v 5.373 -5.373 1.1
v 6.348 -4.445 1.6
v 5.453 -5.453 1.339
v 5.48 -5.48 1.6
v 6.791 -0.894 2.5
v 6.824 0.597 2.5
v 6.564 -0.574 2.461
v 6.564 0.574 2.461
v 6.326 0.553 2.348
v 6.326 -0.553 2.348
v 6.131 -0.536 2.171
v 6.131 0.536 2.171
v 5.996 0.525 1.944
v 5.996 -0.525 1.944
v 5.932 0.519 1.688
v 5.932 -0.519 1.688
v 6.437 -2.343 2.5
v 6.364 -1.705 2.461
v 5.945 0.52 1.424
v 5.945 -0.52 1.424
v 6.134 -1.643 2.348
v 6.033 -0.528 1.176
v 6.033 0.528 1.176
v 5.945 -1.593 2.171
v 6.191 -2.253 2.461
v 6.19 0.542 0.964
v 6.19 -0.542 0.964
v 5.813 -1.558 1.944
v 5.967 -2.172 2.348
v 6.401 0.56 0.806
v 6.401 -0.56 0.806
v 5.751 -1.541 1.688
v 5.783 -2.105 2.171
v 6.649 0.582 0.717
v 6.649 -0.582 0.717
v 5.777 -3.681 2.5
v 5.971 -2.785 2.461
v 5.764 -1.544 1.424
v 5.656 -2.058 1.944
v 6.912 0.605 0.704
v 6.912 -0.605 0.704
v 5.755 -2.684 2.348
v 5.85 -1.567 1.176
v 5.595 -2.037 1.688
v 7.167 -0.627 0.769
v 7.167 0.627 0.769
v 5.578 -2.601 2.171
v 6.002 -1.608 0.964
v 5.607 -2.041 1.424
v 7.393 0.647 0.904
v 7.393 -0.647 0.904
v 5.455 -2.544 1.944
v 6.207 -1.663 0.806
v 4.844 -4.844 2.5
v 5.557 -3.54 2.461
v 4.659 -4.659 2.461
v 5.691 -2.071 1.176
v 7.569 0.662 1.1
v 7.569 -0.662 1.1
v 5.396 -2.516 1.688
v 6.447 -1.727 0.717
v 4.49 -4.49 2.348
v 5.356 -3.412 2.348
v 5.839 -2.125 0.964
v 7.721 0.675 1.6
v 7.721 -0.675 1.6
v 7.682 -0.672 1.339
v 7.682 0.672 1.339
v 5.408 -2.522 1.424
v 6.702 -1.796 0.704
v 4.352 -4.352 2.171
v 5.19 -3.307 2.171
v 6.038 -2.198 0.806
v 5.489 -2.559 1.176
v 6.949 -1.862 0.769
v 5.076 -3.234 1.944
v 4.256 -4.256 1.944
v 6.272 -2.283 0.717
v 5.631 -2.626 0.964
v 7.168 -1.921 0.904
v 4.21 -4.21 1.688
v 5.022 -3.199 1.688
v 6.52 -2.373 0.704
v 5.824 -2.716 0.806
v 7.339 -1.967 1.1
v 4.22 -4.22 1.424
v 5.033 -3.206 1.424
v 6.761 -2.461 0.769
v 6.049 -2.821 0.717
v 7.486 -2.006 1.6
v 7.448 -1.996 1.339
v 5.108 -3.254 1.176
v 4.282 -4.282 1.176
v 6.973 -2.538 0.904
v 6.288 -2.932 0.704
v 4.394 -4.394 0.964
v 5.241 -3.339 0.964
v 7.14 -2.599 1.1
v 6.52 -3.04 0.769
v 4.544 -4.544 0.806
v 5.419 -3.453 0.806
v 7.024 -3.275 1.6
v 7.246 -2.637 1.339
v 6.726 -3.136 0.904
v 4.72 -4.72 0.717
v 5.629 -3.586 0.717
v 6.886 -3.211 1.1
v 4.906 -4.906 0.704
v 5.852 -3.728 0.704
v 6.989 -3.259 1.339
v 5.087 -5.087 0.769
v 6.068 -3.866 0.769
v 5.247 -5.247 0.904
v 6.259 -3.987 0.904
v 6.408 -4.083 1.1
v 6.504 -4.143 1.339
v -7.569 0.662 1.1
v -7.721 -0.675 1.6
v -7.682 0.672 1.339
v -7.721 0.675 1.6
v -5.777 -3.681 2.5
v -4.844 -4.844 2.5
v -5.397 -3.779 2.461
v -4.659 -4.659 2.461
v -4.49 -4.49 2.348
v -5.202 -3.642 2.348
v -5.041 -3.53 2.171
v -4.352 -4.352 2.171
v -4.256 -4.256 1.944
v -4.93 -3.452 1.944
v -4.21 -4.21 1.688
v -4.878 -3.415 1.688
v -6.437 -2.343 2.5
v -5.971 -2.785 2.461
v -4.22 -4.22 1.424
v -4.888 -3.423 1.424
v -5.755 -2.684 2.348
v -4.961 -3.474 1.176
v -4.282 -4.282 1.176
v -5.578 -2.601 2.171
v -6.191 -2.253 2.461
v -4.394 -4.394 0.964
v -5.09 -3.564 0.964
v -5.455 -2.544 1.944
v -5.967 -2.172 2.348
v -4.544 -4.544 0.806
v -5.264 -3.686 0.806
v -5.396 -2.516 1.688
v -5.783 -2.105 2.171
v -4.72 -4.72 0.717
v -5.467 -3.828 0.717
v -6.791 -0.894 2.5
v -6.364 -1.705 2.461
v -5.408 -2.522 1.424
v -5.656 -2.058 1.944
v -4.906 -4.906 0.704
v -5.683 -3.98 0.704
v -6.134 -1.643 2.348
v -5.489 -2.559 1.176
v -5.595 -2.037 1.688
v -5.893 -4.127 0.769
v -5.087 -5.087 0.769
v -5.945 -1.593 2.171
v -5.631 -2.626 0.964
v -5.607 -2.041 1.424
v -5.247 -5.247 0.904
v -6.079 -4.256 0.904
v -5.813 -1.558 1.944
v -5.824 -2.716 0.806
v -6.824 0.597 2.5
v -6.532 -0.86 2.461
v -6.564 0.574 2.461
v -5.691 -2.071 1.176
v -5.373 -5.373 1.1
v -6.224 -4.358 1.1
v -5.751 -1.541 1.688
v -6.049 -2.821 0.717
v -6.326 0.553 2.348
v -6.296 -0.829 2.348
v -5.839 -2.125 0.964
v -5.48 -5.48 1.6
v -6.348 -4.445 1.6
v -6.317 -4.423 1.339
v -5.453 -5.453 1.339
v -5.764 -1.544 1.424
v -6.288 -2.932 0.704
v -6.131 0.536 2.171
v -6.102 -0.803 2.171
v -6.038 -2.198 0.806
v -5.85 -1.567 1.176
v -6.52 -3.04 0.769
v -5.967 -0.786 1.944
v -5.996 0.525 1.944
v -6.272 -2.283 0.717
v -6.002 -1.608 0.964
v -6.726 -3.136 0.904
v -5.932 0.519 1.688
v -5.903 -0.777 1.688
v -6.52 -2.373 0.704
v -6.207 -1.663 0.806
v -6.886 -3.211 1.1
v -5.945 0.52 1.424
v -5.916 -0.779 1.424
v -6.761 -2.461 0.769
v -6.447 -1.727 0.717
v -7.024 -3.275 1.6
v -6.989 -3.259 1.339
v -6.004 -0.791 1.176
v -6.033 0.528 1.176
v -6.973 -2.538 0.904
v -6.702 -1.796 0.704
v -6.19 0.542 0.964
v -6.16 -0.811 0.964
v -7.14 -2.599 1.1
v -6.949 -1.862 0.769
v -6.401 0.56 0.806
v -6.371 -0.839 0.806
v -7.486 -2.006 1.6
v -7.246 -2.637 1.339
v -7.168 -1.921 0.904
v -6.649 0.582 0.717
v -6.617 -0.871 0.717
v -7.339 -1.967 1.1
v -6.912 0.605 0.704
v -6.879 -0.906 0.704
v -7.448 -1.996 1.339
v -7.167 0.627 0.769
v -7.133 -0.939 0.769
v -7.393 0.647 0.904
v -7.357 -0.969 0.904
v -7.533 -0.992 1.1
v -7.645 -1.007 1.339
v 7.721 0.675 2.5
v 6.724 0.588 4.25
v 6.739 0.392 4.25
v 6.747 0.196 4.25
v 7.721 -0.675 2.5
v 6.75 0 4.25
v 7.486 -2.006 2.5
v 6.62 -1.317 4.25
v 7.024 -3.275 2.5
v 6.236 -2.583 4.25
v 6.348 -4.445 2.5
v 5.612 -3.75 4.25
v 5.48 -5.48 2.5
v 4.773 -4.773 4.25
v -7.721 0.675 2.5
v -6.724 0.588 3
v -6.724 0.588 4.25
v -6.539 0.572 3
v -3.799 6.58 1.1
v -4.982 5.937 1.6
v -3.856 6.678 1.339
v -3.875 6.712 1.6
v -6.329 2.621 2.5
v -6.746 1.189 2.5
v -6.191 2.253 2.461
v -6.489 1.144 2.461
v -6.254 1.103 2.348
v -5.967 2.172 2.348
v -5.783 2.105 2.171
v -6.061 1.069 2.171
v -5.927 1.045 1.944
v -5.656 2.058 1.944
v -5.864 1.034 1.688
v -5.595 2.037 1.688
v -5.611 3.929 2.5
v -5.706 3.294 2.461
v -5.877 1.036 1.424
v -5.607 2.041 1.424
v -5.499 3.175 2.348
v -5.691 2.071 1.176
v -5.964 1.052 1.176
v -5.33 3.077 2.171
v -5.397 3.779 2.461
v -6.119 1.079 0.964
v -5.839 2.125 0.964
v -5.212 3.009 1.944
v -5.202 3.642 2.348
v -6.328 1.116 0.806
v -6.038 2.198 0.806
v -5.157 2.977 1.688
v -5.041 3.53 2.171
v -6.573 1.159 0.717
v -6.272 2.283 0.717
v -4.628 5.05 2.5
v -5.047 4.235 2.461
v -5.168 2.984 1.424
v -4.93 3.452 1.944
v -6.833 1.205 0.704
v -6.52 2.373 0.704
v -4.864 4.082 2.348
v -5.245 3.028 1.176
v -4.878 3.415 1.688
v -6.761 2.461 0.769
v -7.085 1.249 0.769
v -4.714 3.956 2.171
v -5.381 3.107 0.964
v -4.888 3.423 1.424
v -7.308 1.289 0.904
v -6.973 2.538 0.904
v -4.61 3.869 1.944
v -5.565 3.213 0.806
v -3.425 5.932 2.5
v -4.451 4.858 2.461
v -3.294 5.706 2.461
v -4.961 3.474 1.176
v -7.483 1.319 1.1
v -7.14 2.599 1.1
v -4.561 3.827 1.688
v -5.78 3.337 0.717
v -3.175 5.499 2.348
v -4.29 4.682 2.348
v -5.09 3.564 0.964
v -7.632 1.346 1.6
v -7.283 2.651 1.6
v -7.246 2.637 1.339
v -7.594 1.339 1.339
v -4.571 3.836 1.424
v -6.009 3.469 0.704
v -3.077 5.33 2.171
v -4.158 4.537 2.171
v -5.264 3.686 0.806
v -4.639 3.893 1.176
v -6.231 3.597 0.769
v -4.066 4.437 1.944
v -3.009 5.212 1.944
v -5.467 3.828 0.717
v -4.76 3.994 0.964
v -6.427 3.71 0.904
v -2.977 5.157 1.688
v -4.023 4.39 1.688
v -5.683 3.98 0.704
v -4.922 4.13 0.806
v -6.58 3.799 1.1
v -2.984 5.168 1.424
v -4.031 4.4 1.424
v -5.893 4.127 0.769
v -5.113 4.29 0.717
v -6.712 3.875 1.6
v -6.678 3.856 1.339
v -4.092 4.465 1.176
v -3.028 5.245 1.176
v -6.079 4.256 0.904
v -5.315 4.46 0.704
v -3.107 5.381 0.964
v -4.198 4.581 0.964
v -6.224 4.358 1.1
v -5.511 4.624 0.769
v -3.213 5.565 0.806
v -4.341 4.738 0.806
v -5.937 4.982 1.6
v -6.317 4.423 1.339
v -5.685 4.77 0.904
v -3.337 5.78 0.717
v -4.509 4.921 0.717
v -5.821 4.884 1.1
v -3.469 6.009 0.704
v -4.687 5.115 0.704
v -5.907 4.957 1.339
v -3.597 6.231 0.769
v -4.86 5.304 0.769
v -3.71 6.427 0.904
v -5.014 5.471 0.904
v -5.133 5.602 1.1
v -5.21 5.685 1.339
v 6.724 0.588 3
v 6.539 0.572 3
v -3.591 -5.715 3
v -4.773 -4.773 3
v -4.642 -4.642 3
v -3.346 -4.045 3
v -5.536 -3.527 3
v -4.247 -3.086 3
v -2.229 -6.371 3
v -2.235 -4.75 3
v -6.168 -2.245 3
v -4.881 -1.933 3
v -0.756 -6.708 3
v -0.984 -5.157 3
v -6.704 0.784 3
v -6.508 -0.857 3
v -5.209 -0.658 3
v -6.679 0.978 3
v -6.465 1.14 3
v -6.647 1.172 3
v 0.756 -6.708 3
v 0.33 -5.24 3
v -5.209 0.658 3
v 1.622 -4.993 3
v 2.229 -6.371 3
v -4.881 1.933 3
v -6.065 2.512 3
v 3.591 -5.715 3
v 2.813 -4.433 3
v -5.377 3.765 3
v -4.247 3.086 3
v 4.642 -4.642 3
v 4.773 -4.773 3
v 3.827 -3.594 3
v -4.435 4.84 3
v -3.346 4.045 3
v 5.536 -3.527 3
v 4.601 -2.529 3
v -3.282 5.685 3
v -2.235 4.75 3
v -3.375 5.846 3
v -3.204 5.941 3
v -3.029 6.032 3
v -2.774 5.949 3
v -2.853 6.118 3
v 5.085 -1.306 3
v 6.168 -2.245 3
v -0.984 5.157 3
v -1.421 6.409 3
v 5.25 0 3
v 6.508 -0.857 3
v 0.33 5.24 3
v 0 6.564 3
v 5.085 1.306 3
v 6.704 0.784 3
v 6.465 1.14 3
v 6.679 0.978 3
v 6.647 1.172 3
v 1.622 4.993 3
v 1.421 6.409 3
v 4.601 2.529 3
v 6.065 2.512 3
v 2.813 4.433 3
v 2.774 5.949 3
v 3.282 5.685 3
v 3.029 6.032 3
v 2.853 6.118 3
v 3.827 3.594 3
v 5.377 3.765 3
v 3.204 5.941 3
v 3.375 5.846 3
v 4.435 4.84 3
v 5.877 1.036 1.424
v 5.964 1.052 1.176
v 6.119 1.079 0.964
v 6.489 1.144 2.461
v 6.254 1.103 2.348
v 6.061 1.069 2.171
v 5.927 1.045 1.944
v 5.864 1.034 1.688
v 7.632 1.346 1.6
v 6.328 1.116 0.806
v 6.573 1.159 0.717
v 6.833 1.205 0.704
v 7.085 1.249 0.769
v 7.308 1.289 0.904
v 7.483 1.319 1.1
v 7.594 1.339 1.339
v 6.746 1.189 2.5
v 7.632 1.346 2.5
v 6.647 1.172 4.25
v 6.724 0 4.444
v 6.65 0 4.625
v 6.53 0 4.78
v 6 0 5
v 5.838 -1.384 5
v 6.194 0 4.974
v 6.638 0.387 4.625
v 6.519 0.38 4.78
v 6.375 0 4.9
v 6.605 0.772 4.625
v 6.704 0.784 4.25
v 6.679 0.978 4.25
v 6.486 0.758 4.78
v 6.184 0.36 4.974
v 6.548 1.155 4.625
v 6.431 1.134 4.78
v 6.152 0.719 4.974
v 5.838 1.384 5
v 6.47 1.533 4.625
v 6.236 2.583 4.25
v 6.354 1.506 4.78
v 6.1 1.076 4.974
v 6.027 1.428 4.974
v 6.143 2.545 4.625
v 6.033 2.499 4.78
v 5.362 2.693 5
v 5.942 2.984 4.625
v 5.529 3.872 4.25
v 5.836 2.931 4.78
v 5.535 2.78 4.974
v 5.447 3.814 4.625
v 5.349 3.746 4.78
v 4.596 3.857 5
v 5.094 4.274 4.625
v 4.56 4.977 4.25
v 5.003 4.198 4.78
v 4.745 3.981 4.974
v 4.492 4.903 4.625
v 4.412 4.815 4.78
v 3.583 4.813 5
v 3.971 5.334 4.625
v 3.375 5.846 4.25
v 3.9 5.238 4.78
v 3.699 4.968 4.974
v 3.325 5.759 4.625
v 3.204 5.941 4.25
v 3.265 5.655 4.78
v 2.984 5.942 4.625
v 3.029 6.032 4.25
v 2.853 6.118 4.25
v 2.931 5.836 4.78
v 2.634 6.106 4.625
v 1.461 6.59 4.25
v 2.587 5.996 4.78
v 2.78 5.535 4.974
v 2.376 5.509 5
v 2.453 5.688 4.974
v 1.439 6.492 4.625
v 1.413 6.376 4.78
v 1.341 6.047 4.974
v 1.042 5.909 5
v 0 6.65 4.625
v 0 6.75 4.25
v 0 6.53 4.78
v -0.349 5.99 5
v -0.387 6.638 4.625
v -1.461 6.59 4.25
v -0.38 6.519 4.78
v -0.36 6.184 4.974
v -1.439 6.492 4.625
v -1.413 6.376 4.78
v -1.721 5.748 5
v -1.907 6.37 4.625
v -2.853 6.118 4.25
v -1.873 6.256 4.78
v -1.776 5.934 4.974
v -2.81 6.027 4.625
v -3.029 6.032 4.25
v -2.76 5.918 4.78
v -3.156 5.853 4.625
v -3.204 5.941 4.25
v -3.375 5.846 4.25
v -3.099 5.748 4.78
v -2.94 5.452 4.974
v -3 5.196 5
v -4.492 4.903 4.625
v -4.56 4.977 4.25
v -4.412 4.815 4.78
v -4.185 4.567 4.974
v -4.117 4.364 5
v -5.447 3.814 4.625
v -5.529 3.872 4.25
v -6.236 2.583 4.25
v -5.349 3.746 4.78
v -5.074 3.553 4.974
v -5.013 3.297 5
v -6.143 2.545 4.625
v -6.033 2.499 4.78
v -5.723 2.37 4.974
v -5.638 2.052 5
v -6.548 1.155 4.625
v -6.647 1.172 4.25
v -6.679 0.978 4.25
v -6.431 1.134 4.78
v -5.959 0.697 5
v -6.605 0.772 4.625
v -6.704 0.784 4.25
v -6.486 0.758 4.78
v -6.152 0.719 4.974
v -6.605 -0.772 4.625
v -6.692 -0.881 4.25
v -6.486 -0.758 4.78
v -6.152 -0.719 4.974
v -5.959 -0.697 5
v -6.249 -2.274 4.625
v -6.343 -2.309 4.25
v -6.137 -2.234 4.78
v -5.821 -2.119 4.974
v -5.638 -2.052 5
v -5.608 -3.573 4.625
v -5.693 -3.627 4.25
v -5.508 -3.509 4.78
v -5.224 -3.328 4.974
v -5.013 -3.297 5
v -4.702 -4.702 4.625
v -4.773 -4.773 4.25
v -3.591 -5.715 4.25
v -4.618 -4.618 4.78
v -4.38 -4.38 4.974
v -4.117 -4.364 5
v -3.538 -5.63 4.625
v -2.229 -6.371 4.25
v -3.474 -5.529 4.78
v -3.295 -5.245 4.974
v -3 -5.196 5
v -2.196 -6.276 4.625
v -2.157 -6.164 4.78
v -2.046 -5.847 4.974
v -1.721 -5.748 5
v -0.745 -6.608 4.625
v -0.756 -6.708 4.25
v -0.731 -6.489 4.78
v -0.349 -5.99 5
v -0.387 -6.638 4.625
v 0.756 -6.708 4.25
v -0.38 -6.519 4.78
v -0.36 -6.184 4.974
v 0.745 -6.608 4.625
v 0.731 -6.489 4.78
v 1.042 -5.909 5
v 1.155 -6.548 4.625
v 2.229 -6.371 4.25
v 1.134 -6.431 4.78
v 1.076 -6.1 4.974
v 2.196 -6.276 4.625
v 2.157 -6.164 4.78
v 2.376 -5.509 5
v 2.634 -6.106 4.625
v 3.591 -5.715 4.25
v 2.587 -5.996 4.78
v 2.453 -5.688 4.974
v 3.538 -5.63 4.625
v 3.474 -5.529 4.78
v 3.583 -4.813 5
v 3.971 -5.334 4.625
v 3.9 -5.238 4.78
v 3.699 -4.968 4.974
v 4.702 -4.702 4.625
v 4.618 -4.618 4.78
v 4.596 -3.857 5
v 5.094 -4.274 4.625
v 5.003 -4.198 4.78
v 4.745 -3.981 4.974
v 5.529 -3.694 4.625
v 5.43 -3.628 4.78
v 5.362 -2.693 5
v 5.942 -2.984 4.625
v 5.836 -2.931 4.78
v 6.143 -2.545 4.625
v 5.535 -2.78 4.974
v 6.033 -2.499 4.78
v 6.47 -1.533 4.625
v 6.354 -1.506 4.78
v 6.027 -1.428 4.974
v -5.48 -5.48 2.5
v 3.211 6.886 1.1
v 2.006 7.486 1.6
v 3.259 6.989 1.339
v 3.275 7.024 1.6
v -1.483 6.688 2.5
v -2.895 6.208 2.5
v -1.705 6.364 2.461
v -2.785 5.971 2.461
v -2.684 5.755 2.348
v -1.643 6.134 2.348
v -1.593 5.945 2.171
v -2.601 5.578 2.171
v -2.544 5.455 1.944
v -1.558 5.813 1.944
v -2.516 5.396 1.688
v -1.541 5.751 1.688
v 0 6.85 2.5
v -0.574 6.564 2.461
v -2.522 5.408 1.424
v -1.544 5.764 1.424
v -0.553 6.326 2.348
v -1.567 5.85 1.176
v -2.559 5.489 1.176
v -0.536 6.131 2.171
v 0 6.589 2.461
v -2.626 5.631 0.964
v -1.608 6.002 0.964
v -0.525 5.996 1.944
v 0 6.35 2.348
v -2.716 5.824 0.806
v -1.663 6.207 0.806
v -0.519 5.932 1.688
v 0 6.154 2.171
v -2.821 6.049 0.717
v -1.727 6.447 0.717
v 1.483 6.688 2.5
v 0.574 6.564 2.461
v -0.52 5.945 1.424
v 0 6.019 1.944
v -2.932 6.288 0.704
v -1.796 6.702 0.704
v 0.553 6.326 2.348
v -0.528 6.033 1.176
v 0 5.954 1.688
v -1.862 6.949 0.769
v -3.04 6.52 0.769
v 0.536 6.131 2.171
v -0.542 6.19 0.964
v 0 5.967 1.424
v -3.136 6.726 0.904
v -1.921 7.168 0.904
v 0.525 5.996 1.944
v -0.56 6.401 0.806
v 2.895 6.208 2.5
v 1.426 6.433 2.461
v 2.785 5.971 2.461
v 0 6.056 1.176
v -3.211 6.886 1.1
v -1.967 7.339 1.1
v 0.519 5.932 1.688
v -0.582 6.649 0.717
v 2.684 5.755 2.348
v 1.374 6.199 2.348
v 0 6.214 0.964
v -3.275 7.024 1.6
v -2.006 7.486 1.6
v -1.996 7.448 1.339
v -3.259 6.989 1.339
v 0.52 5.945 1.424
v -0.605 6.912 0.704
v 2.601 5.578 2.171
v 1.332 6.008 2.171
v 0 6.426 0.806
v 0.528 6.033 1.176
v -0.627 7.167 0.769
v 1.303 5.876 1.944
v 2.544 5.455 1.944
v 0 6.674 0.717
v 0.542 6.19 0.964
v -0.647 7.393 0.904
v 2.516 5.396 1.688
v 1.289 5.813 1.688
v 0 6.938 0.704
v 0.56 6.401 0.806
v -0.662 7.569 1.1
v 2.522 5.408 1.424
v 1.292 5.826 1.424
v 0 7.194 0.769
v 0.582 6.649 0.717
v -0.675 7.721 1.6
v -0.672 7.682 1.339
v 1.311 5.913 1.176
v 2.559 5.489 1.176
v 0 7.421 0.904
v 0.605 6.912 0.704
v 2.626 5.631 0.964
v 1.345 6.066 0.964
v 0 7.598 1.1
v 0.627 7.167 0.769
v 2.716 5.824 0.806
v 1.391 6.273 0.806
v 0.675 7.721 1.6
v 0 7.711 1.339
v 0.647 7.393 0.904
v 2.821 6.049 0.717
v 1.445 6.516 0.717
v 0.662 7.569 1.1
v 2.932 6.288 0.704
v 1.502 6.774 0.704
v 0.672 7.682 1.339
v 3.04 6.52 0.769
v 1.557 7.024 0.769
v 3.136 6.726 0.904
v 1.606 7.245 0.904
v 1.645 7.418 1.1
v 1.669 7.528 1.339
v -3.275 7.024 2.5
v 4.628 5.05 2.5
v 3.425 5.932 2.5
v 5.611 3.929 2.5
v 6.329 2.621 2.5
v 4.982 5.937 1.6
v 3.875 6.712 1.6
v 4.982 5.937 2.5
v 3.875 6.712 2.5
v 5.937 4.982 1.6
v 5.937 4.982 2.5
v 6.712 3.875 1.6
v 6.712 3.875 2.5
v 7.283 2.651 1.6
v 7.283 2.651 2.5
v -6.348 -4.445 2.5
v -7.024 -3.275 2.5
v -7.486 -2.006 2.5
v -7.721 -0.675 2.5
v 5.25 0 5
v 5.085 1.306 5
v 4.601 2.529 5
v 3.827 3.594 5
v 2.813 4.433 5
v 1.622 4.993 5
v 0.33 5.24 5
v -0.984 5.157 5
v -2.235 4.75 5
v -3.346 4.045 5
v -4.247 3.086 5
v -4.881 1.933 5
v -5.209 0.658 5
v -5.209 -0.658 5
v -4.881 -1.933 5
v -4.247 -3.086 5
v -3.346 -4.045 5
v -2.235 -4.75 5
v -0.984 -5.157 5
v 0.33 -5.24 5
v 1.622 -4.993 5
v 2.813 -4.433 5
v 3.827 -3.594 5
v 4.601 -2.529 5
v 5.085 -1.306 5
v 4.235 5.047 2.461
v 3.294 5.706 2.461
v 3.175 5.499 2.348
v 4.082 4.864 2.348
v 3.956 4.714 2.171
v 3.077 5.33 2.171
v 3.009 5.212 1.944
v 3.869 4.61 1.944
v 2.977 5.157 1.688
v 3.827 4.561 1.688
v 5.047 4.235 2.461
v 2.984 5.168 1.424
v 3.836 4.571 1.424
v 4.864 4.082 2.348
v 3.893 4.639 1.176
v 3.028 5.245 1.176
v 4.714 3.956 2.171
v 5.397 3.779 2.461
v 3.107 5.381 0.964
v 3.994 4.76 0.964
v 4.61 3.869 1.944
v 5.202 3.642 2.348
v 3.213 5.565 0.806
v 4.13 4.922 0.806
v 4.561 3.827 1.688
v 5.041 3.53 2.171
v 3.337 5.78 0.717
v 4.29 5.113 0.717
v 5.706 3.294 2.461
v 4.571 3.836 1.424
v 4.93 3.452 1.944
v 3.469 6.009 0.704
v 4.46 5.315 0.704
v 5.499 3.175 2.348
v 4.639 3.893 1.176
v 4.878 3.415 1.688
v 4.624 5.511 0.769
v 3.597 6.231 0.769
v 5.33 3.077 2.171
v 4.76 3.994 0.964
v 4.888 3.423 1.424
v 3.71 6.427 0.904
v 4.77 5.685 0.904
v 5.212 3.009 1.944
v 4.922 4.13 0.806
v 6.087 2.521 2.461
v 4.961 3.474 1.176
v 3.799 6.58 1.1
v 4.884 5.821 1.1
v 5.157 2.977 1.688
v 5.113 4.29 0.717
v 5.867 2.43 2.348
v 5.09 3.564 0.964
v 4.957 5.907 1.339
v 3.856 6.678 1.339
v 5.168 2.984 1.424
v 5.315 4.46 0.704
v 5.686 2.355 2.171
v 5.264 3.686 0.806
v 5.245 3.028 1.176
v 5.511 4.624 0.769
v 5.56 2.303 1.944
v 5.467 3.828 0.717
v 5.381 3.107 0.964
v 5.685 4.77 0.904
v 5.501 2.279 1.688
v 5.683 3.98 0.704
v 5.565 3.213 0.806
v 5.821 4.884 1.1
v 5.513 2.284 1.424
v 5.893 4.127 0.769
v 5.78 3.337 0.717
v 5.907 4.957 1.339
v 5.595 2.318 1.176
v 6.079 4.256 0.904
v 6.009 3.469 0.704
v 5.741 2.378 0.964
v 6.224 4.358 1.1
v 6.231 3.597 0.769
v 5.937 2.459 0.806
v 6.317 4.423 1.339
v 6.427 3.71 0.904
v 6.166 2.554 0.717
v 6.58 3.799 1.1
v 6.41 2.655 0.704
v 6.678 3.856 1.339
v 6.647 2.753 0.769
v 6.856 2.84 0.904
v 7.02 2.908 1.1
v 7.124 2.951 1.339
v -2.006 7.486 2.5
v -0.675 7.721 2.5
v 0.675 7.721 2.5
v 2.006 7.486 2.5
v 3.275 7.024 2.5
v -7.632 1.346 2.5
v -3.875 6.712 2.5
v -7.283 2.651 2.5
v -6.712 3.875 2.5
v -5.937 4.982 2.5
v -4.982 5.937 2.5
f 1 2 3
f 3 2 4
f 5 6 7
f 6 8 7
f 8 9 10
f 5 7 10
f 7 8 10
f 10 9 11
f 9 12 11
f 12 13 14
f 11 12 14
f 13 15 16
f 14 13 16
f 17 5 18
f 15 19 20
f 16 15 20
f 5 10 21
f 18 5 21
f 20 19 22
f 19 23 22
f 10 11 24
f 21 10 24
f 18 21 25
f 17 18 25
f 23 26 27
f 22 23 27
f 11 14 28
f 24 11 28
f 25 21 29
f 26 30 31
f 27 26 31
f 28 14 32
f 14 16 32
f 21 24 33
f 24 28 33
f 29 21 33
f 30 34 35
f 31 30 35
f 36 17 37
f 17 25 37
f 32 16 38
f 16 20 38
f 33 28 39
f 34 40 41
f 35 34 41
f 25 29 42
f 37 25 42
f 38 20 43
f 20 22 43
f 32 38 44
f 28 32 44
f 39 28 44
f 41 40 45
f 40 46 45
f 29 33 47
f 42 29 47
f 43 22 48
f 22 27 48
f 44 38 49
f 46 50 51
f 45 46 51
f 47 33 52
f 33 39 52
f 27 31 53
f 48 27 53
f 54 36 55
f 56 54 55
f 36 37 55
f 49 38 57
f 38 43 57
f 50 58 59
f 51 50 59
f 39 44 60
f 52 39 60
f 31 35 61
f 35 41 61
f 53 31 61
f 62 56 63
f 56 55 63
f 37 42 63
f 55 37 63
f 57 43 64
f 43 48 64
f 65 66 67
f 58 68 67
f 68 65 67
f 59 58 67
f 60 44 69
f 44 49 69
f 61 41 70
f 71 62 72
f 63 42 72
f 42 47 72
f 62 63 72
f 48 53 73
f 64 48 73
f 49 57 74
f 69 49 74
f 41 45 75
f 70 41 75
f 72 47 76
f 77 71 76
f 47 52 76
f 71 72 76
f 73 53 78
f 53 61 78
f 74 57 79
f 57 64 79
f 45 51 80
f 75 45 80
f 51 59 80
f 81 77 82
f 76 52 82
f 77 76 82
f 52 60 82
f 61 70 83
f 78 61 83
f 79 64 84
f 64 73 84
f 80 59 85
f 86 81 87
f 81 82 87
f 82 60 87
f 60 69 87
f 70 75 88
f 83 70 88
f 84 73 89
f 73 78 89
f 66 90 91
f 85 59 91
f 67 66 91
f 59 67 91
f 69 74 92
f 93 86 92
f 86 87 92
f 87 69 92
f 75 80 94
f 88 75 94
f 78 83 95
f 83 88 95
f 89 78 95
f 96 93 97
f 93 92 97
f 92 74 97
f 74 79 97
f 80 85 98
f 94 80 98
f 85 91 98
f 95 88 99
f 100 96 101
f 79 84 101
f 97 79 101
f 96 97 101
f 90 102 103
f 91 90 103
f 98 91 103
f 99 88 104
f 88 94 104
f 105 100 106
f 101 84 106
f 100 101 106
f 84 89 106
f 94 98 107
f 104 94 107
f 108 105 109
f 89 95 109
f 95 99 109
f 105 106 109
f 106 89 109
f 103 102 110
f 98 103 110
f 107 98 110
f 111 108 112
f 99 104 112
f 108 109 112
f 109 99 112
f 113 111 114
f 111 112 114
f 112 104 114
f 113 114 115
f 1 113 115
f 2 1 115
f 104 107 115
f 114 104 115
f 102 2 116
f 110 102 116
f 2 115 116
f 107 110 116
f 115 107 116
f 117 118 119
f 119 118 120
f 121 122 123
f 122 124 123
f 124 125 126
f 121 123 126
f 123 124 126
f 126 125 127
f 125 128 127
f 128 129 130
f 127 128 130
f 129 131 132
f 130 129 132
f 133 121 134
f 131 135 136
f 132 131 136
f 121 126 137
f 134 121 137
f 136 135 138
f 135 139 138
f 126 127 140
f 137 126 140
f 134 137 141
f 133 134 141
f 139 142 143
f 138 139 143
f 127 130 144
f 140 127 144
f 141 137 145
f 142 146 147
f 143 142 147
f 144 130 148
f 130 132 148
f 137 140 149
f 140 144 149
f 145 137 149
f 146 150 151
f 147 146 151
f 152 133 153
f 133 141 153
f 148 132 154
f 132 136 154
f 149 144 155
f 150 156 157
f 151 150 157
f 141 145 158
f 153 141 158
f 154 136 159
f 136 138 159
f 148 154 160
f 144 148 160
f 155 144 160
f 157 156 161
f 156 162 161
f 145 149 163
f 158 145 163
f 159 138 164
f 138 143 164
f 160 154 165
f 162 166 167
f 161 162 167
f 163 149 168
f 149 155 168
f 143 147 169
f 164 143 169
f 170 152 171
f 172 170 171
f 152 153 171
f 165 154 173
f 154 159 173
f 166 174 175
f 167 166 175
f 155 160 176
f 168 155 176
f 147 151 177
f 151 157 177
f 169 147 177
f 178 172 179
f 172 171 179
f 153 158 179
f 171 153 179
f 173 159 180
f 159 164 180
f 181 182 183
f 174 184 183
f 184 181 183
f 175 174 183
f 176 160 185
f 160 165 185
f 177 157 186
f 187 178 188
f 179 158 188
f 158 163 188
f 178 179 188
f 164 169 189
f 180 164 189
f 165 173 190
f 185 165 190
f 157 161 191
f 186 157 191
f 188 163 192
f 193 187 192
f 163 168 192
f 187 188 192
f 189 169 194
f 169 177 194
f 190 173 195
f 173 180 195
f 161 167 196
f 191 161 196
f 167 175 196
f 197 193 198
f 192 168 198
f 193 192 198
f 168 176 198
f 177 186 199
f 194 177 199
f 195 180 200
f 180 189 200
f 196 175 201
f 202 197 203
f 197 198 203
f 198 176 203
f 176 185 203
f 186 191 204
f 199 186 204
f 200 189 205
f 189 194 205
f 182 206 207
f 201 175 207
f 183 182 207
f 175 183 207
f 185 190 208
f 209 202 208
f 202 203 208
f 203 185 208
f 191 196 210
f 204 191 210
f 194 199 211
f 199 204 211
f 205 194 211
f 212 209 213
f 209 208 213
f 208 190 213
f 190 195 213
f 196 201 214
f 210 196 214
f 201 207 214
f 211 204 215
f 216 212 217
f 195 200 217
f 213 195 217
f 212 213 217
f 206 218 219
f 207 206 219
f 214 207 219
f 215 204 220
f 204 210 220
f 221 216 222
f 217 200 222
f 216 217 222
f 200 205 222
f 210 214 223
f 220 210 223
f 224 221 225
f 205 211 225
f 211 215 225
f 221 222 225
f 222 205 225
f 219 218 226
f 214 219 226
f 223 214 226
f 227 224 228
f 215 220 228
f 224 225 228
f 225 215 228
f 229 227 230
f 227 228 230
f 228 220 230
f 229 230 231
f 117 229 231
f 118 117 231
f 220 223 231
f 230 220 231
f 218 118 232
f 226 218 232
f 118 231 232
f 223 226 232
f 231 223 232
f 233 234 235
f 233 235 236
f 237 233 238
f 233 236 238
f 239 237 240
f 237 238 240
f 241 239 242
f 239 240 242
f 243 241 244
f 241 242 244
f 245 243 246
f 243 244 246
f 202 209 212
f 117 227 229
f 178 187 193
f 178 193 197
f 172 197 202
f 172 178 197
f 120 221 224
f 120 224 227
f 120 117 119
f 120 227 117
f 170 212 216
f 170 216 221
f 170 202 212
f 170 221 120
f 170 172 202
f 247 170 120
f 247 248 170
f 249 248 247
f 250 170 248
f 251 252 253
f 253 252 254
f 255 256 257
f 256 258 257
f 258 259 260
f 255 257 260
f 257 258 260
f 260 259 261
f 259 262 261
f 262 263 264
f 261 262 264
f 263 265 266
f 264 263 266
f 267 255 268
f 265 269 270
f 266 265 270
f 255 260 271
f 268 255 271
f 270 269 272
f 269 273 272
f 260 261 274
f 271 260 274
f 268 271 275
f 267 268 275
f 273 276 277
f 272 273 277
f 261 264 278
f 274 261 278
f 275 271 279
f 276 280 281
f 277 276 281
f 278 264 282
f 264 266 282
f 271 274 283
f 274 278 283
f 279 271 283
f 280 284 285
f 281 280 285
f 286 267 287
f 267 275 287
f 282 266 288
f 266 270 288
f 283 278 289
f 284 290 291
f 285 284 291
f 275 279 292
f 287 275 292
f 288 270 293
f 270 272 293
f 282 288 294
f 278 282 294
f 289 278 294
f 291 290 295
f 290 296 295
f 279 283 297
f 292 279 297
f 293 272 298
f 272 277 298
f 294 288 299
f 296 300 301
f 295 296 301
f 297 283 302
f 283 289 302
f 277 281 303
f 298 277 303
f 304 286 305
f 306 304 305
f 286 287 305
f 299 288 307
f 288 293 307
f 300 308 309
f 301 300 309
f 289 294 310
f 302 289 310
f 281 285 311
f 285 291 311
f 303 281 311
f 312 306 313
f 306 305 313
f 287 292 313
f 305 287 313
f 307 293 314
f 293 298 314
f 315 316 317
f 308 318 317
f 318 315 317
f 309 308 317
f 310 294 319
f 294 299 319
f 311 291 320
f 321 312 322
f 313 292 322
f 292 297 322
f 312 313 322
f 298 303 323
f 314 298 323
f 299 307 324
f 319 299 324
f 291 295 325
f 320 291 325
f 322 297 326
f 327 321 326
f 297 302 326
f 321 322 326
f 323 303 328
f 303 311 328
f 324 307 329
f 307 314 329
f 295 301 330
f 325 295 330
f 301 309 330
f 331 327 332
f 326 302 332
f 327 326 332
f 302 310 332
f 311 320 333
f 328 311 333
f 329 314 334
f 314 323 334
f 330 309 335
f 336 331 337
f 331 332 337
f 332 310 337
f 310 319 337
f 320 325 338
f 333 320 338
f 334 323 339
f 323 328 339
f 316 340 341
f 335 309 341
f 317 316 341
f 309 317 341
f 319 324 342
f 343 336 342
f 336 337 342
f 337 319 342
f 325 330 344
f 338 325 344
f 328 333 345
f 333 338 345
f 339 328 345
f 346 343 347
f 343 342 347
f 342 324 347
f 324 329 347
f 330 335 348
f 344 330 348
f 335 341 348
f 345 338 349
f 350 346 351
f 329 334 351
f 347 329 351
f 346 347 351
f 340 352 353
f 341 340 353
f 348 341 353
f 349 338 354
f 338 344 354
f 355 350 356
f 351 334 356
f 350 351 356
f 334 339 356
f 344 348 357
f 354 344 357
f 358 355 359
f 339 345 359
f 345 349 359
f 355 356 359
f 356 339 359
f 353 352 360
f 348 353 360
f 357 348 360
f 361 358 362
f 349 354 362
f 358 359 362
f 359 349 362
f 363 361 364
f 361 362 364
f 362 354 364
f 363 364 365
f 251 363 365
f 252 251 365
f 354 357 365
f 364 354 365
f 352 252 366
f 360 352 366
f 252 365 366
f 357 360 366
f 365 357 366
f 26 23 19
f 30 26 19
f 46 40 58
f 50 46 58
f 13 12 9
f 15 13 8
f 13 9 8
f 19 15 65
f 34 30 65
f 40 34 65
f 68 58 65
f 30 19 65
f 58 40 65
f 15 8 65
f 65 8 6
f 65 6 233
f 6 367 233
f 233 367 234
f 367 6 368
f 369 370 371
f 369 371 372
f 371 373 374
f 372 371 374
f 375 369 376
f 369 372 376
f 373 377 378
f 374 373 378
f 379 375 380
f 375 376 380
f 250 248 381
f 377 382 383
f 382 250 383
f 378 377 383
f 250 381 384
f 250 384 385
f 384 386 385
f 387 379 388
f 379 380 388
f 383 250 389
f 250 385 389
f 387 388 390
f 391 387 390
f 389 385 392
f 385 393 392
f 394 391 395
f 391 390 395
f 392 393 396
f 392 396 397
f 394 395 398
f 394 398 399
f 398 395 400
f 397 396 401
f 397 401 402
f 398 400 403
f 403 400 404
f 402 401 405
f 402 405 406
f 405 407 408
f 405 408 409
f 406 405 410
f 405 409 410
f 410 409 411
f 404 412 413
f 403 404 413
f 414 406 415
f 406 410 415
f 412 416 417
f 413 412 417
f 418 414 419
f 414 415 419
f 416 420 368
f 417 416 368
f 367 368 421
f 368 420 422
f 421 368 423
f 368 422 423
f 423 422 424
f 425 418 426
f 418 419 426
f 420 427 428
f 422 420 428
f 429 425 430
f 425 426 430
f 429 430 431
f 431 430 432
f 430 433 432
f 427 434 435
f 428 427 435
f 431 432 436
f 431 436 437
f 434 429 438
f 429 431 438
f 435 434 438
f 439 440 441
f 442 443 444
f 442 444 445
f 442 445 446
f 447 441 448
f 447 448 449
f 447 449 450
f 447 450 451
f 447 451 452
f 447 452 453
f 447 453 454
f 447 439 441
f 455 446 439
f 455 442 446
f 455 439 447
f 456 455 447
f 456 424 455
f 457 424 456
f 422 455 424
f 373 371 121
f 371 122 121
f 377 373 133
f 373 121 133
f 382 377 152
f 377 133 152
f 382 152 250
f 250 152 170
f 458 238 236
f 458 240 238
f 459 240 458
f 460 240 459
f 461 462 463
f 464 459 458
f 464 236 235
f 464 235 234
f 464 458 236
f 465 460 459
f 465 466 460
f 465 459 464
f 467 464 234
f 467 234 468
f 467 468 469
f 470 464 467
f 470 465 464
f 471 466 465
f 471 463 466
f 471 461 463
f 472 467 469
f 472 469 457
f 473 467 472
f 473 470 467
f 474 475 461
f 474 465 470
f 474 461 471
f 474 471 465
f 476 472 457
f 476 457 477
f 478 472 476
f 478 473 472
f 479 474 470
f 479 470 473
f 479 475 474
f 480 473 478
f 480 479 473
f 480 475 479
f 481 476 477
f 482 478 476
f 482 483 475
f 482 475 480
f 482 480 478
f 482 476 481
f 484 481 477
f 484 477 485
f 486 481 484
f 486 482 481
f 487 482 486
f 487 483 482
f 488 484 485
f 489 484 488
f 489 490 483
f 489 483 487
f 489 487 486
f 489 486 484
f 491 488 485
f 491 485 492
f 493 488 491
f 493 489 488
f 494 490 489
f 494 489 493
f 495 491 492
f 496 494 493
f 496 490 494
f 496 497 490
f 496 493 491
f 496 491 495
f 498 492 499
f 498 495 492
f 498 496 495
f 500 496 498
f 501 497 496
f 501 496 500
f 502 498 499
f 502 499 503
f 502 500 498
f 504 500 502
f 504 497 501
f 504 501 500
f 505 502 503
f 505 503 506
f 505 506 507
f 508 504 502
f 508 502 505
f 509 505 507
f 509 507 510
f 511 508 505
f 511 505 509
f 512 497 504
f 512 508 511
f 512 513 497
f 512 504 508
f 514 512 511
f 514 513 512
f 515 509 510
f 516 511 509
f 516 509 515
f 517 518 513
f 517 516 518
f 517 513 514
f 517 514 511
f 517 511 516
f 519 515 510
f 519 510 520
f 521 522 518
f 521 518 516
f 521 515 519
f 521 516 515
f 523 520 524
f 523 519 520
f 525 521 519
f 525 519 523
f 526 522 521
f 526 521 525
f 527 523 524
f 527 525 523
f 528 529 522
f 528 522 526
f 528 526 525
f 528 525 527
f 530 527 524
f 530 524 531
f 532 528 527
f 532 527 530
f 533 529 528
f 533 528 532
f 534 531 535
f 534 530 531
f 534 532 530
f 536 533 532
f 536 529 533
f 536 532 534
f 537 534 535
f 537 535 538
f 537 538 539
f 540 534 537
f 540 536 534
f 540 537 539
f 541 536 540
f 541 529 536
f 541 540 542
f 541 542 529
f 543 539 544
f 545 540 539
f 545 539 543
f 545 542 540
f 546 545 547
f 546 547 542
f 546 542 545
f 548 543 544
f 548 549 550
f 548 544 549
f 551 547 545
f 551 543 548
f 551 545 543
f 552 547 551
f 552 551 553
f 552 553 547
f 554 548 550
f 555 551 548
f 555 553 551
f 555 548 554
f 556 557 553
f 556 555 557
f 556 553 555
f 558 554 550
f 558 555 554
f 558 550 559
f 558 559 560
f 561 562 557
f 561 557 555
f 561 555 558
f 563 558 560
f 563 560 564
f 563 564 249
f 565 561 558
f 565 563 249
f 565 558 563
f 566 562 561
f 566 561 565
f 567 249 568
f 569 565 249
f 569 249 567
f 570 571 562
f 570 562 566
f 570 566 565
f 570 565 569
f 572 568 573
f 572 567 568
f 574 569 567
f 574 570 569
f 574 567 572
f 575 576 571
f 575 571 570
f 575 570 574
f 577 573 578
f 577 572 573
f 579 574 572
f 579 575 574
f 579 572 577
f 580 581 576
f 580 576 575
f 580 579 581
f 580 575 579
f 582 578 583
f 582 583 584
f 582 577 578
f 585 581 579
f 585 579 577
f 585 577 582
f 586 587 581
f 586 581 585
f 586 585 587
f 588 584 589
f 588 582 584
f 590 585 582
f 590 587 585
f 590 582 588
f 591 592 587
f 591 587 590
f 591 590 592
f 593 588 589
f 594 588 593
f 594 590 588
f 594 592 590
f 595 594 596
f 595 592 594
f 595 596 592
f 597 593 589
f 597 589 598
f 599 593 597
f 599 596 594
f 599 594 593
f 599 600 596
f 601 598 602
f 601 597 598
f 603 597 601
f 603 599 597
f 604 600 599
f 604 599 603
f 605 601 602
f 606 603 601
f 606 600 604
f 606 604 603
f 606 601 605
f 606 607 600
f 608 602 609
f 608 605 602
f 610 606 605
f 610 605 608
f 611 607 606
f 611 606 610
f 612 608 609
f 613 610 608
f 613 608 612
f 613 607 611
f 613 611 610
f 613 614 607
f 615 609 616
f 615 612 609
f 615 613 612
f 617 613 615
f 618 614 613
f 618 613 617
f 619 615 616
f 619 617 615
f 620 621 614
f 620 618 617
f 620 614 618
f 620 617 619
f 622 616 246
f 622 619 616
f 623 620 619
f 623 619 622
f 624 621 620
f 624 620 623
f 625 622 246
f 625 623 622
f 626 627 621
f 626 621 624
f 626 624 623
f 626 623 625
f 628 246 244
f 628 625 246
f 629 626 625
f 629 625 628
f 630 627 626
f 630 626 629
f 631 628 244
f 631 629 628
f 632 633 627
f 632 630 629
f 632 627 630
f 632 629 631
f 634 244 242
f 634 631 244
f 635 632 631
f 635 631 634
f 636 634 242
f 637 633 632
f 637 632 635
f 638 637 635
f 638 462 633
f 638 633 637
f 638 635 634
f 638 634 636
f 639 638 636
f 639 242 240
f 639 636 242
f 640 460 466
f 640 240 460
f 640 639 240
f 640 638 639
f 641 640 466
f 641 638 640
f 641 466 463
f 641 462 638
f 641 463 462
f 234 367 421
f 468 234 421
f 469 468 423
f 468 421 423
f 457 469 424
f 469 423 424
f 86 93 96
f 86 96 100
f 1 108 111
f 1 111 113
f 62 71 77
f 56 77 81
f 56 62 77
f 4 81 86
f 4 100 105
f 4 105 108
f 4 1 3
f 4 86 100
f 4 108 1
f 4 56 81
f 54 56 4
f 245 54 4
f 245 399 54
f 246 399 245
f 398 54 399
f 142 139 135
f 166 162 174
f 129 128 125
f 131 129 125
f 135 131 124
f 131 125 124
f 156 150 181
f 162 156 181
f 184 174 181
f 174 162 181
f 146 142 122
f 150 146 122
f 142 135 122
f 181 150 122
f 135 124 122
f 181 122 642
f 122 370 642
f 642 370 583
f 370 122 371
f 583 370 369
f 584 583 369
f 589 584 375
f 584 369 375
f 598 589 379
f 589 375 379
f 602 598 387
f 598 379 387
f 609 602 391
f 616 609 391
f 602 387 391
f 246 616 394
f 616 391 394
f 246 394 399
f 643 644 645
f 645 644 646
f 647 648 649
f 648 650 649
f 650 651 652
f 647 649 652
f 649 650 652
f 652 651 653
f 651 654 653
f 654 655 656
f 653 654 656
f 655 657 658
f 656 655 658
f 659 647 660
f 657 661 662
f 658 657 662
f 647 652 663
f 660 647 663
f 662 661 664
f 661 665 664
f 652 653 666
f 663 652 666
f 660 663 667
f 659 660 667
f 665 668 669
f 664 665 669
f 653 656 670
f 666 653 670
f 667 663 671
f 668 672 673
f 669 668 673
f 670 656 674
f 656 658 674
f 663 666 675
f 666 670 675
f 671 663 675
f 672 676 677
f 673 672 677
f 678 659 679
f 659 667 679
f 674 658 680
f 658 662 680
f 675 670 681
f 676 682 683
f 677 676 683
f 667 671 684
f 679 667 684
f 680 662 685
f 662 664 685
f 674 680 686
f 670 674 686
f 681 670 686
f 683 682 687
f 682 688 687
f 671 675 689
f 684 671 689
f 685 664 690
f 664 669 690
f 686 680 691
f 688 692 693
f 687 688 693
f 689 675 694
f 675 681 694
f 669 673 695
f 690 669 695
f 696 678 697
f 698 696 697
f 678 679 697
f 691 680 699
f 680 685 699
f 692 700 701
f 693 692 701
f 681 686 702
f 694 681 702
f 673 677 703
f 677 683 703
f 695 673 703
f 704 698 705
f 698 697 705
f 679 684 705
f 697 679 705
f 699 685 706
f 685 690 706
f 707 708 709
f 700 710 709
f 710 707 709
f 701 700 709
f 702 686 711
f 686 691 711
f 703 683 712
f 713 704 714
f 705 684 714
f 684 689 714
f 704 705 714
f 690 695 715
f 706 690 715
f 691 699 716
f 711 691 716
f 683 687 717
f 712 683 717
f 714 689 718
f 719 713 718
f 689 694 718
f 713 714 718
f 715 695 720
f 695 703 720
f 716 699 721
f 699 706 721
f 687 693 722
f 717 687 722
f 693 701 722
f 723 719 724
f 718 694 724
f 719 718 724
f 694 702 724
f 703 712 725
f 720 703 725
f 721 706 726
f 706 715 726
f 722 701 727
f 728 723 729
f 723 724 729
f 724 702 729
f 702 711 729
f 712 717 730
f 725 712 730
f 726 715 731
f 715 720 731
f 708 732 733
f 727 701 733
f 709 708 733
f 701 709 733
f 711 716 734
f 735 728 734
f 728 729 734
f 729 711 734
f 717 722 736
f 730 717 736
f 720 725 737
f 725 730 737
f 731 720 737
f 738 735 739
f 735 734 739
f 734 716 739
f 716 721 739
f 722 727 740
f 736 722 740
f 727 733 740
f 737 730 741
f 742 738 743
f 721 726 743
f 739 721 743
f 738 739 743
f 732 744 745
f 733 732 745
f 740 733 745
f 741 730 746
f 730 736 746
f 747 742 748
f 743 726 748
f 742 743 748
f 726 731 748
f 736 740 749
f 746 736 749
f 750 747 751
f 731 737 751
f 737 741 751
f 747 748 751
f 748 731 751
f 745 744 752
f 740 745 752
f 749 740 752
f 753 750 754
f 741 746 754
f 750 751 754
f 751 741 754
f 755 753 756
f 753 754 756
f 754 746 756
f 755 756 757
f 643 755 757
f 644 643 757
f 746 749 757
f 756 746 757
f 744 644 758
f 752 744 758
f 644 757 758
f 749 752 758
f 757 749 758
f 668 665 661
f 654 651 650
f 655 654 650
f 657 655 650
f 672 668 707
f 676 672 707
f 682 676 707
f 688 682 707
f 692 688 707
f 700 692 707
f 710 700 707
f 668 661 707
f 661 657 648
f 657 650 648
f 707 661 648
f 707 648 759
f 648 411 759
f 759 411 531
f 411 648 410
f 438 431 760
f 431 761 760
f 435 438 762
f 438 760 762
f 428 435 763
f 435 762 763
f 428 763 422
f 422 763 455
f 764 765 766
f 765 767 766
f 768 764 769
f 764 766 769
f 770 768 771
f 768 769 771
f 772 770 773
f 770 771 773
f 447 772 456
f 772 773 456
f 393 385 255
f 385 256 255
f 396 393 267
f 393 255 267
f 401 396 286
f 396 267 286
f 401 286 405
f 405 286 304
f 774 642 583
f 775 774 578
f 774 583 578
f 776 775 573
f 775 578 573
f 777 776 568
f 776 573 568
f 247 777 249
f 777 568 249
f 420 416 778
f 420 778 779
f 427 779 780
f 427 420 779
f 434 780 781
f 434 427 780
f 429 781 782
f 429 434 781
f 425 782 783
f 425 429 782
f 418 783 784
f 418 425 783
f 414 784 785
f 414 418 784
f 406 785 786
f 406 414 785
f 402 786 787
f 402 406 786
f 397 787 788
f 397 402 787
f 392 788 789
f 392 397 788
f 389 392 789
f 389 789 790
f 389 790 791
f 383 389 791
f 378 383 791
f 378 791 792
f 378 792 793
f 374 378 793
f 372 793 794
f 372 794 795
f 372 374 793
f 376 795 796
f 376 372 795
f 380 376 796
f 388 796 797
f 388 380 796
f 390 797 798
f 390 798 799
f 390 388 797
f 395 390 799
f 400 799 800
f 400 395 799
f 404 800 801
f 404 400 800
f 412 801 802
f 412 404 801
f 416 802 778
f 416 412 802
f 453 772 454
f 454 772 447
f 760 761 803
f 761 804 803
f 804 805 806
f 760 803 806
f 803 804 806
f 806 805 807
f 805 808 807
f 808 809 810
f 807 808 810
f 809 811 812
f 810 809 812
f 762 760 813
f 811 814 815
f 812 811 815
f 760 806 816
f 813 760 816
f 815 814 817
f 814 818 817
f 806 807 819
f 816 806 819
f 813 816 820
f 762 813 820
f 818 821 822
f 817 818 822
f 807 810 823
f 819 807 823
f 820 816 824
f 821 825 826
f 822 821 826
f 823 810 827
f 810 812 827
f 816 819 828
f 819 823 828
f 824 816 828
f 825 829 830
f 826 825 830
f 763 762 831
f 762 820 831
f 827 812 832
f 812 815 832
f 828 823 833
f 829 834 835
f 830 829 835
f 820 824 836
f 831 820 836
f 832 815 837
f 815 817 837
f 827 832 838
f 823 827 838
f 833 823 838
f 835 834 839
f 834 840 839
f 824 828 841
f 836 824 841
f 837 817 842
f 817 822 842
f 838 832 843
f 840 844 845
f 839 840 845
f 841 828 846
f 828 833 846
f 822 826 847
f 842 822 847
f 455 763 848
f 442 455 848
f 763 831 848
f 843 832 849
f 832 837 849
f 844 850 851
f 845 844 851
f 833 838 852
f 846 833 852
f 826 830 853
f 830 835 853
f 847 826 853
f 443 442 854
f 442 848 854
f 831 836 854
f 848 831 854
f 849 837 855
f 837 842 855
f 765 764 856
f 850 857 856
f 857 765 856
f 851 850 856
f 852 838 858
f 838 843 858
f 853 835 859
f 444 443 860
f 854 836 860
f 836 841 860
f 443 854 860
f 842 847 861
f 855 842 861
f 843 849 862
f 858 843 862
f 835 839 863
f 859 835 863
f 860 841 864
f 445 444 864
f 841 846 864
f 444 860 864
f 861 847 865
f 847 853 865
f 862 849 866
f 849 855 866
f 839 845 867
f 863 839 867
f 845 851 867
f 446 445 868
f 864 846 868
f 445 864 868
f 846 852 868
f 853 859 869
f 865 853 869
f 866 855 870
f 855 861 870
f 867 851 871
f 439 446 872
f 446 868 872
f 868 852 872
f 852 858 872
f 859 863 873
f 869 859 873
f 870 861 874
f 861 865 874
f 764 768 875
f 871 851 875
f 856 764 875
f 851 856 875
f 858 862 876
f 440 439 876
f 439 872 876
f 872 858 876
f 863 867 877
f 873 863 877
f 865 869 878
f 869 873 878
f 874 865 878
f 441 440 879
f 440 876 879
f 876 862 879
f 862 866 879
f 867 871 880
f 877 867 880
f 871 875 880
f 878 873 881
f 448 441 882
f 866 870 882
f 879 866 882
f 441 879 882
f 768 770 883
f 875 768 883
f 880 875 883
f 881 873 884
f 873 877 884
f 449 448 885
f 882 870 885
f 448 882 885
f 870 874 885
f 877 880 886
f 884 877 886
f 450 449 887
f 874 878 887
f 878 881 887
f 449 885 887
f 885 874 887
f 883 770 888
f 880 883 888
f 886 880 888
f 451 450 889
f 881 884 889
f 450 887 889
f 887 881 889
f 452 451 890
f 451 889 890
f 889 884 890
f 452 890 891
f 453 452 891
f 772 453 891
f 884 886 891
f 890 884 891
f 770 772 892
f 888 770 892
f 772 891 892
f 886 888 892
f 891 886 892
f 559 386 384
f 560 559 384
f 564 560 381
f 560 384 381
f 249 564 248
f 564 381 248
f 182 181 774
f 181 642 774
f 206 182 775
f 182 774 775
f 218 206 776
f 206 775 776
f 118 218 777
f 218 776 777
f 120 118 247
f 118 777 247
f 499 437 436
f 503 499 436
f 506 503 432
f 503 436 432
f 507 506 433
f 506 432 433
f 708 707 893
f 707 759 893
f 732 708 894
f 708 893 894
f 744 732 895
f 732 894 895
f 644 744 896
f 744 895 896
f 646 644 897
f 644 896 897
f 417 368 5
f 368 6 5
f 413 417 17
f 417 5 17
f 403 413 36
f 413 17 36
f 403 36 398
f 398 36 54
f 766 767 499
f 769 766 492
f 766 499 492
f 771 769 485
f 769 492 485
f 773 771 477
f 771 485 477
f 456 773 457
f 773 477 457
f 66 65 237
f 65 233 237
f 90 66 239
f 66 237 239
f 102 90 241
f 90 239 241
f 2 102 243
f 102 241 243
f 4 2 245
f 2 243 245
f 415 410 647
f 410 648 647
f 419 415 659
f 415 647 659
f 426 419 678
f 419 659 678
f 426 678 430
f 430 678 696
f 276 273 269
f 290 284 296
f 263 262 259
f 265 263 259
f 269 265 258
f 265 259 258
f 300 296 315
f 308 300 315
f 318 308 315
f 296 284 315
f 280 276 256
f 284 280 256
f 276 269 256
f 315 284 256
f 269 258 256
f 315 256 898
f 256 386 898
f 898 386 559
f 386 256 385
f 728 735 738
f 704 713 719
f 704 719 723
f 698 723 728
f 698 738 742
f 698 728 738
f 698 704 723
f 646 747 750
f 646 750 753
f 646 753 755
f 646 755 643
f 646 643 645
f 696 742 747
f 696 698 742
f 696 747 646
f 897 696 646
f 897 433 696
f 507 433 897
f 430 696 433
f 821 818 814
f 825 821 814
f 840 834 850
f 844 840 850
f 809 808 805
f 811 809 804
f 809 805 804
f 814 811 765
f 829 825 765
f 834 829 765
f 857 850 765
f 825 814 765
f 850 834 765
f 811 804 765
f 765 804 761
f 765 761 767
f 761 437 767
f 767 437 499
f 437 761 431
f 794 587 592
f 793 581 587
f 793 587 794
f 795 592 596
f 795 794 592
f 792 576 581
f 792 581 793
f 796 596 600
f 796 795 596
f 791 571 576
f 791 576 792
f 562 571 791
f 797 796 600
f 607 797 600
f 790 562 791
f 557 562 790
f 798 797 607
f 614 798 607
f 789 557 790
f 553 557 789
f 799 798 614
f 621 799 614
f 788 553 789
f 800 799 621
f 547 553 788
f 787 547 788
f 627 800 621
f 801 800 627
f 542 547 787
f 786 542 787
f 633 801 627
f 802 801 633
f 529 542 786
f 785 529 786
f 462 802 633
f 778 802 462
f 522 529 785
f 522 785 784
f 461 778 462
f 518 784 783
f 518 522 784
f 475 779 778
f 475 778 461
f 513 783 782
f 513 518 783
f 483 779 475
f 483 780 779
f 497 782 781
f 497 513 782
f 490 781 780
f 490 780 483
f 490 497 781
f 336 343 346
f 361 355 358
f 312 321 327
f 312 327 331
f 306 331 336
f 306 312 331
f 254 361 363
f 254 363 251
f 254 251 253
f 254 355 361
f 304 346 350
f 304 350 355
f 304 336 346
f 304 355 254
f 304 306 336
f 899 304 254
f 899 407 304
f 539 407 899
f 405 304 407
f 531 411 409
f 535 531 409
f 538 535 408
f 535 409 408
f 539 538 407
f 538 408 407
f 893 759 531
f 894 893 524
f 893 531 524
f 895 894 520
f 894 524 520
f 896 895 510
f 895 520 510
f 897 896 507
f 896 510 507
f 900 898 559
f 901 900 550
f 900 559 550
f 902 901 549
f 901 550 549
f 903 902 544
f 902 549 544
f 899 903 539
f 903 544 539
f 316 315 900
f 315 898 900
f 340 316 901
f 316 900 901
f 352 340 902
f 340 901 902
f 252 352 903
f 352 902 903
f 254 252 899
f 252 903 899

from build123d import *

# Parameters (mm, degrees)
SKETCH012_R         = 6.75
SKETCH012_R_2       = 5.25
PAD005_DEPTH        = 2
FILLET_R            = 0.75
REVOLUTION002_ANGLE = -50
POLARPATTERN_COUNT  = 5
POLARPATTERN_ANGLE  = 220


with BuildPart() as part:
    # Sketch012 → Pad005 (new body)
    with BuildSketch(Plane.XY):
        Circle(SKETCH012_R)
        Circle(SKETCH012_R_2, mode=Mode.SUBTRACT)
    extrude(amount=PAD005_DEPTH)

    # Fillet
    fillet_edges = [part.edges().sort_by_distance(p)[0] for p in [
        (-6.75, 0, 2),
    ]]
    fillet(fillet_edges, radius=FILLET_R)

    # Sketch013 → Revolution002 (revolve)
    with BuildSketch(Plane(origin=(0, 0, 0), x_dir=(-0.7071067812, -0.7071067812, 0), z_dir=(-0.7071067812, 0.7071067812, 0))):
        with BuildLine():
            Line((7.75, -1.400000012), (7.75, -0.5))
            Line((7.75, -0.5), (6.75, 1.25))
            Line((6.75, 1.25), (6.5642857143, 0))
            Line((6.5642857143, 0), (6.85, -0.5))
            ThreePointArc((6.85, -0.5), (6.2136038927, -2.0363960988), (7.75, -1.400000012))
        make_face()
    revolution002 = revolve(axis=Axis((0, 0, 0), (0, 0, 1)), revolution_arc=REVOLUTION002_ANGLE)

    # PolarPattern: Revolution002 ×5 about axis
    polarpattern_axis = Axis((0, 0, 0), (0, 0, -1))
    for i in range(1, POLARPATTERN_COUNT):
        add(revolution002.rotate(polarpattern_axis, i * POLARPATTERN_ANGLE / (POLARPATTERN_COUNT - 1)))


with BuildPart() as part_1:
    # Body004 placement: moved
    add(part.part.moved(Location((0, 0, 3))))


solid = part_1.part
